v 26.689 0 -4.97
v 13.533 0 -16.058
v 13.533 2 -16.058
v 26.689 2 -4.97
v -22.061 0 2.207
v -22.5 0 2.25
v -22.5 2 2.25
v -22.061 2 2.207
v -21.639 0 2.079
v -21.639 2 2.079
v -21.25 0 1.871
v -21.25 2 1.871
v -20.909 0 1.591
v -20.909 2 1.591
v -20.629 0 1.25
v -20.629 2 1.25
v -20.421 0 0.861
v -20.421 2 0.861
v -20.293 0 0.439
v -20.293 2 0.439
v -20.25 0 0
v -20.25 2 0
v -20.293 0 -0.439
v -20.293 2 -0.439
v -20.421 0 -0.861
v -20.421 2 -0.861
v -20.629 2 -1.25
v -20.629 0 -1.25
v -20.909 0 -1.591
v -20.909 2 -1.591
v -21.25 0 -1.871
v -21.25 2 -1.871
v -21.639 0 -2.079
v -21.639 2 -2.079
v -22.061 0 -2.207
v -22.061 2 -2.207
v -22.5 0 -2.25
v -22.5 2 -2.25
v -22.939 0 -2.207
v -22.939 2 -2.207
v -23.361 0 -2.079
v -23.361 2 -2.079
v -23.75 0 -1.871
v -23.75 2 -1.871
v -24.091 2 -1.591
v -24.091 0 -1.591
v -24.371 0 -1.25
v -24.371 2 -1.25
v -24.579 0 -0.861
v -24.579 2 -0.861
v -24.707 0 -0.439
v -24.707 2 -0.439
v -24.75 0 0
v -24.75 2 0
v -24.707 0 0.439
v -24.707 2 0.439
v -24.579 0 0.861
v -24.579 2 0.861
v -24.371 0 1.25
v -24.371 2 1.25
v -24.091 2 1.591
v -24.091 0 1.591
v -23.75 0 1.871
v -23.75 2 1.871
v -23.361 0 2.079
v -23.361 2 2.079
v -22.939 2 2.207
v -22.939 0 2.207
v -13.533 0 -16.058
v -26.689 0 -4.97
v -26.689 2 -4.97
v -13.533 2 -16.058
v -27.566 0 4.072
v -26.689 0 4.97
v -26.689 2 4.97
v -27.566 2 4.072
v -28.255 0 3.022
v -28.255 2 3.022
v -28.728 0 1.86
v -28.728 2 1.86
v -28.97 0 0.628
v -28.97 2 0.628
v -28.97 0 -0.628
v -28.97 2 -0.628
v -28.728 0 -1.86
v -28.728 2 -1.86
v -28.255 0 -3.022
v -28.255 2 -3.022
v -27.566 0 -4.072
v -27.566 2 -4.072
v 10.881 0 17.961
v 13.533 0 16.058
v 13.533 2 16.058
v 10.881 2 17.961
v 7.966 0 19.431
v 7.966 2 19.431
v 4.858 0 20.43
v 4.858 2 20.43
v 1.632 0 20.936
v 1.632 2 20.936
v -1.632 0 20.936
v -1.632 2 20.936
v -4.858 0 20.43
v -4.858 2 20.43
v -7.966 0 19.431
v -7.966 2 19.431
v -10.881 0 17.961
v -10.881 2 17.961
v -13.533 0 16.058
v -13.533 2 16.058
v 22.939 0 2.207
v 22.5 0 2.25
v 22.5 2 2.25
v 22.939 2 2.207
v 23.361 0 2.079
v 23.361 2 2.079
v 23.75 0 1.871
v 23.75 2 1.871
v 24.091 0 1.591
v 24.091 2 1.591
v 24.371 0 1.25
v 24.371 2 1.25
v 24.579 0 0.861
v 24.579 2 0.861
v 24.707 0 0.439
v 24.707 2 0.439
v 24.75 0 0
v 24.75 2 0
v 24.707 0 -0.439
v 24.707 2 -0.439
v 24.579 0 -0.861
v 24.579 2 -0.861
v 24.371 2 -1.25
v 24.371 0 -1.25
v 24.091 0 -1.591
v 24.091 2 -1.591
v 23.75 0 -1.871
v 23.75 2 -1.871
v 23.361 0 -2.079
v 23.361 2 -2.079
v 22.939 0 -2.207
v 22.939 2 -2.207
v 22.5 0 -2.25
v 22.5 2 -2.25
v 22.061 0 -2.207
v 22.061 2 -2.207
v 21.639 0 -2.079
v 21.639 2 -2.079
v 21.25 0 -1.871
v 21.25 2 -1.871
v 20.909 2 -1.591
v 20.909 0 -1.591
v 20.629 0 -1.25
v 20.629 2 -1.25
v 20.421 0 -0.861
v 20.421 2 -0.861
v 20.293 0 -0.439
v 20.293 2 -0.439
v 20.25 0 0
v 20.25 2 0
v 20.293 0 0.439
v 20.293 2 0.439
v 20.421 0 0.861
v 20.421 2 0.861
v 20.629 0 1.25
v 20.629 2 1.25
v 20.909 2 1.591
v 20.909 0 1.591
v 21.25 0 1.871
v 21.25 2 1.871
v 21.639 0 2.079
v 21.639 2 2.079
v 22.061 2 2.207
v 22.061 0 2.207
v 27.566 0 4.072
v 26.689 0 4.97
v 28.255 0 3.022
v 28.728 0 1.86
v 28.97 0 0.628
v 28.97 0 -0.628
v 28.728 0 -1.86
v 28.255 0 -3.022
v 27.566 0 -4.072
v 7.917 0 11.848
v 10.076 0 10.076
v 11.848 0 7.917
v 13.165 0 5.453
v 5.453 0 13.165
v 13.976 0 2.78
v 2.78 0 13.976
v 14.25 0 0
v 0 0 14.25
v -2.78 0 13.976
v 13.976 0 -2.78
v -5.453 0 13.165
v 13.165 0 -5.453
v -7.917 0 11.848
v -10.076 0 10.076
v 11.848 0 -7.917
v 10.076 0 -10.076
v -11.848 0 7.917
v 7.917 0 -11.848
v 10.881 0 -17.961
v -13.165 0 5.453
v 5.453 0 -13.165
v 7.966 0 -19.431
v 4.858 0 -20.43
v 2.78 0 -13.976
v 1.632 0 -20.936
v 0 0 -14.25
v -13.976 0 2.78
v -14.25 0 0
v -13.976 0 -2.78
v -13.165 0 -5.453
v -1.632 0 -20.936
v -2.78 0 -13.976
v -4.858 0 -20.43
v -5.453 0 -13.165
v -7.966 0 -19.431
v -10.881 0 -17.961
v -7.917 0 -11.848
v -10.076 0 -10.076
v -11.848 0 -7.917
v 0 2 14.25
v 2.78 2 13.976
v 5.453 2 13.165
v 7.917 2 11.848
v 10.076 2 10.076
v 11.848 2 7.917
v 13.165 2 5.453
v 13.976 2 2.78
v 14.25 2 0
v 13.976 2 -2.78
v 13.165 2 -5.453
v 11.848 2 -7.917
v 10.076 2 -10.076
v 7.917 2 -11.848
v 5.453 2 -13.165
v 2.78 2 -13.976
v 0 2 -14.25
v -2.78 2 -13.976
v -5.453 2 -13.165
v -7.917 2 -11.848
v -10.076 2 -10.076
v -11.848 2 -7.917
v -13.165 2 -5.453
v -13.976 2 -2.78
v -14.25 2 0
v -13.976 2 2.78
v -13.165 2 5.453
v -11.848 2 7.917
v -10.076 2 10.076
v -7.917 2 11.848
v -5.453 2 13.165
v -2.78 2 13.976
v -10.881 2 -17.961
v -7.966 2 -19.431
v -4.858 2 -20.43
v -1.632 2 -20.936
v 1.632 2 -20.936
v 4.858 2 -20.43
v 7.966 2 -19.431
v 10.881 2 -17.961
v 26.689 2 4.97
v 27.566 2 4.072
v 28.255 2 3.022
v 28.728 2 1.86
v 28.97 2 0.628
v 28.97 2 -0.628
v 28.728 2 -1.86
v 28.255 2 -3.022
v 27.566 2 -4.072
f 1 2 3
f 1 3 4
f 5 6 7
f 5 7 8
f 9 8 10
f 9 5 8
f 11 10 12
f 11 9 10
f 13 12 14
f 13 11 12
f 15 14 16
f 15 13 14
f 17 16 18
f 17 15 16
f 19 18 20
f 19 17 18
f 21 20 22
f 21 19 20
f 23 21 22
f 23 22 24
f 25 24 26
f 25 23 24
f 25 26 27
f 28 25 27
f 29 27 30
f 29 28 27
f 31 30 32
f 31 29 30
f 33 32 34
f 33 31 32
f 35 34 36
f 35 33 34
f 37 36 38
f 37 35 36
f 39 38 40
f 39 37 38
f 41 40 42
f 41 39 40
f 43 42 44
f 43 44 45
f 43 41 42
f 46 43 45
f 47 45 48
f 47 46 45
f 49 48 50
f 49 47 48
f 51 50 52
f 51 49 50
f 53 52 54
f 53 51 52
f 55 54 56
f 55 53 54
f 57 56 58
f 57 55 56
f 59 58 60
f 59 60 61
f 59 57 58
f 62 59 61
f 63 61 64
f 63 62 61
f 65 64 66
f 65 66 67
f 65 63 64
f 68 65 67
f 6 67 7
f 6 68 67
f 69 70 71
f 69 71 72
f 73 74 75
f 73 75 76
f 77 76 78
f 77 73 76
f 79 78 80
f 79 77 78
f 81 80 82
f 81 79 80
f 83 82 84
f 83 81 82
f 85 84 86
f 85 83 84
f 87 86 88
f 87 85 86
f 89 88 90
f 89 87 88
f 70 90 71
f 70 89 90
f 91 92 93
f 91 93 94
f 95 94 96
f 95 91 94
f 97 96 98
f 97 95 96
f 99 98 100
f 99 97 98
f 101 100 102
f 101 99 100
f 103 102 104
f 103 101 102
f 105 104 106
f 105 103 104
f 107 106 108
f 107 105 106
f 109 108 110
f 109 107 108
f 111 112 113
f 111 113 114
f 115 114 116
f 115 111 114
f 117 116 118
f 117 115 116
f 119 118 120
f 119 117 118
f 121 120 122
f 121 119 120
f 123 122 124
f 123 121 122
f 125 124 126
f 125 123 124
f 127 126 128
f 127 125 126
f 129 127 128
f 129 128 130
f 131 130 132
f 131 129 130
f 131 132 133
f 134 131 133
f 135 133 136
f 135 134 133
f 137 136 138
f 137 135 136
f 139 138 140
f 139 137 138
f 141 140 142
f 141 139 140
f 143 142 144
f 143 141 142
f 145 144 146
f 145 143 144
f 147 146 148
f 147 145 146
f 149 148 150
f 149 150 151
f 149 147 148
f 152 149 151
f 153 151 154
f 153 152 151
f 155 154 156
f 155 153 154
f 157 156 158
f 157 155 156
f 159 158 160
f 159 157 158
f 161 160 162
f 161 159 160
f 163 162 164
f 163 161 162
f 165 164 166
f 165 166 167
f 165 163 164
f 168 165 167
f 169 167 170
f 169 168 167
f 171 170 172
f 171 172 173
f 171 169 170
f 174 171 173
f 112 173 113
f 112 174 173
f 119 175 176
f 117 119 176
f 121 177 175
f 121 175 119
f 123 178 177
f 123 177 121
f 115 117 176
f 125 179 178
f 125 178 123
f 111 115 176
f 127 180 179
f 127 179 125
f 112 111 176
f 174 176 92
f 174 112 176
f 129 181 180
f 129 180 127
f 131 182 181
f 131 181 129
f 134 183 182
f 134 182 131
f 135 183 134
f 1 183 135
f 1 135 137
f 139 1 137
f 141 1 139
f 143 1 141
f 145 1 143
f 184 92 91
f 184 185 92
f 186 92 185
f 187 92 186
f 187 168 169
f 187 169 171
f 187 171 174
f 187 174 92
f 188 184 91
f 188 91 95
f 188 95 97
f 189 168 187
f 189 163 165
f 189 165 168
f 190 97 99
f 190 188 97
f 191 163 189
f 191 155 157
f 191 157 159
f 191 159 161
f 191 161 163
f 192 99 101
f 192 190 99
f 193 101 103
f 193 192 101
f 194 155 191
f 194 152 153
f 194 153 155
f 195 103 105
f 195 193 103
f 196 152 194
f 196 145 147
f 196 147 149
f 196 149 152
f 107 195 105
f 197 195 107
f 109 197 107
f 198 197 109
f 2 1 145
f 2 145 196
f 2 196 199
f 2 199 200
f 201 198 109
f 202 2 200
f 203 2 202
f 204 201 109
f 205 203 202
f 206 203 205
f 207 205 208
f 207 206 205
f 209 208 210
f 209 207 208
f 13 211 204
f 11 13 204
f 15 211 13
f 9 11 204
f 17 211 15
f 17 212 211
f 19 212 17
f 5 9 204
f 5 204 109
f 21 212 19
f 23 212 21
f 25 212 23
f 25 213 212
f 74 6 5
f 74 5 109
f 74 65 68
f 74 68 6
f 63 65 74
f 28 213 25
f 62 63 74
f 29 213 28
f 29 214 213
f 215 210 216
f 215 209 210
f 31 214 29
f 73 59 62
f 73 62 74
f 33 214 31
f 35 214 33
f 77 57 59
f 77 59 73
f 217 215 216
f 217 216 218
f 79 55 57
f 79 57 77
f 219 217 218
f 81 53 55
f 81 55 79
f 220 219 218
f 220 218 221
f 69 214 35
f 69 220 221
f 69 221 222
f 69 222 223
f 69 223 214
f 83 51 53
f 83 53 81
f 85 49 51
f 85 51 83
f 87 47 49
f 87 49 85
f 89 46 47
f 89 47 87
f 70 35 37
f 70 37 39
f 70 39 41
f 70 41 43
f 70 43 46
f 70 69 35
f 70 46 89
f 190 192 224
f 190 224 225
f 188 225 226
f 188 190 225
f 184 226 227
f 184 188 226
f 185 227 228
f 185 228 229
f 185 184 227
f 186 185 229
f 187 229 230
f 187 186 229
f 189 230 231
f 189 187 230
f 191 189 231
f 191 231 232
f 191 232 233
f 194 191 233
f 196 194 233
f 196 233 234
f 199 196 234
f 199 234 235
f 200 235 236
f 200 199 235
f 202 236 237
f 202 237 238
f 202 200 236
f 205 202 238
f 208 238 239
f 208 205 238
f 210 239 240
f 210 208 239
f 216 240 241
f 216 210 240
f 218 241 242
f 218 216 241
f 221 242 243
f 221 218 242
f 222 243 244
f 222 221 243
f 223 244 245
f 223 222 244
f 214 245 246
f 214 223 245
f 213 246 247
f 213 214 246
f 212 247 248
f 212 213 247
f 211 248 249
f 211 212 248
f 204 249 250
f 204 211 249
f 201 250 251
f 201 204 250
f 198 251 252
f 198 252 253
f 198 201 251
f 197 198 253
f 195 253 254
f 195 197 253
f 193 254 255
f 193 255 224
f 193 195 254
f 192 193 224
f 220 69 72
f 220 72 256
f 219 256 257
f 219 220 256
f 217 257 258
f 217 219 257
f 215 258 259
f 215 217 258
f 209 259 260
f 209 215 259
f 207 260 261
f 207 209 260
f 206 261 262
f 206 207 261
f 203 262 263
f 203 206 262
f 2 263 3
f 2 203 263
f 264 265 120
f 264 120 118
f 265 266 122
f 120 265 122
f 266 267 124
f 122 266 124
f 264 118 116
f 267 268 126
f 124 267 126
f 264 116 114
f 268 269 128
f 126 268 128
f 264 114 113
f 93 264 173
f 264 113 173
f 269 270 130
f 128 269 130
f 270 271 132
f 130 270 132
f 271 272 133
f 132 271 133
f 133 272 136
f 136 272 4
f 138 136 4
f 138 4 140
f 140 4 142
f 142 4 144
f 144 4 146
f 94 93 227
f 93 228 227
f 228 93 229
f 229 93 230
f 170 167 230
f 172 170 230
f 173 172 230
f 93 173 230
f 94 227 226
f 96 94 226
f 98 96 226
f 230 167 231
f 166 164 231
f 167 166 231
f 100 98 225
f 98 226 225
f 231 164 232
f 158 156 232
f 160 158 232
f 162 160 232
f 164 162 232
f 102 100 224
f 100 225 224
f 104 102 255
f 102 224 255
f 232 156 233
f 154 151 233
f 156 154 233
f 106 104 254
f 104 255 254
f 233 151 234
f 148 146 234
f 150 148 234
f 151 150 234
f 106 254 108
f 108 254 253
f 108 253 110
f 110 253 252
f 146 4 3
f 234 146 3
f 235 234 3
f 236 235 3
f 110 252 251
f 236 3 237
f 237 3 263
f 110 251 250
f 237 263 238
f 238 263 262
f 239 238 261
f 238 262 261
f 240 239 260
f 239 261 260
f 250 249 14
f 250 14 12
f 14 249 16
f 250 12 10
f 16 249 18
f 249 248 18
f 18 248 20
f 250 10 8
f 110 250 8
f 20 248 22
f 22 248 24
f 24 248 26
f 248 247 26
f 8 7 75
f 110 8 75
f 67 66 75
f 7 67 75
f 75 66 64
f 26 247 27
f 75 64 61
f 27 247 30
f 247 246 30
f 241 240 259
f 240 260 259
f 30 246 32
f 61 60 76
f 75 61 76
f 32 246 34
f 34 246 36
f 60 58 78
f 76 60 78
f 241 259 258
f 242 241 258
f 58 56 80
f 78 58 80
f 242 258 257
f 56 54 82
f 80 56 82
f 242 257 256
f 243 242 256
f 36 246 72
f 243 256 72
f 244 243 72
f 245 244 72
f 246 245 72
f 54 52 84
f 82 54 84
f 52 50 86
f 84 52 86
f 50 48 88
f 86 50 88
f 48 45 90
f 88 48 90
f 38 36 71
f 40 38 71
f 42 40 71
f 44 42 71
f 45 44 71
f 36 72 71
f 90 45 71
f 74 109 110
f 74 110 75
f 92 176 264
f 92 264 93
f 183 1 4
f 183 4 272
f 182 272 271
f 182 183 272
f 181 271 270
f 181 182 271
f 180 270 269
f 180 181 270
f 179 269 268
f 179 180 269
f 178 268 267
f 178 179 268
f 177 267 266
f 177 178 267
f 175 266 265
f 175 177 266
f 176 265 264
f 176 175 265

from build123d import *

# Parameters (mm, degrees)
ESQUISSE1_R      = 14.25
ESQUISSE1_R_2    = 2.25
EXTRUSION1_DEPTH = 2


with BuildPart() as part:
    # Esquisse1 → Extrusion1 (new body)
    with BuildSketch(Plane(origin=(0, 0, 0), x_dir=(1, 0, 0), z_dir=(0, 1, 0))):
        with BuildLine():
            Line((13.533333333, 16.057673832), (26.688888889, 4.970232377))
            ThreePointArc((26.688888889, 4.970232377), (29, 0), (26.688888889, -4.970232377))
            Line((26.688888889, -4.970232377), (13.533333333, -16.057673832))
            ThreePointArc((13.533333333, -16.057673832), (0, -21), (-13.533333333, -16.057673832))
            Line((-13.533333333, -16.057673832), (-26.688888889, -4.970232377))
            ThreePointArc((-26.688888889, -4.970232377), (-29, 0), (-26.688888889, 4.970232377))
            Line((-26.688888889, 4.970232377), (-13.533333333, 16.057673832))
            ThreePointArc((-13.533333333, 16.057673832), (0, 21), (13.533333333, 16.057673832))
        make_face()
        Circle(ESQUISSE1_R, mode=Mode.SUBTRACT)
        with Locations((22.5, 0)):
            Circle(ESQUISSE1_R_2, mode=Mode.SUBTRACT)
        with Locations((-22.5, 0)):
            Circle(ESQUISSE1_R_2, mode=Mode.SUBTRACT)
    extrude(amount=EXTRUSION1_DEPTH)


solid = part.part
